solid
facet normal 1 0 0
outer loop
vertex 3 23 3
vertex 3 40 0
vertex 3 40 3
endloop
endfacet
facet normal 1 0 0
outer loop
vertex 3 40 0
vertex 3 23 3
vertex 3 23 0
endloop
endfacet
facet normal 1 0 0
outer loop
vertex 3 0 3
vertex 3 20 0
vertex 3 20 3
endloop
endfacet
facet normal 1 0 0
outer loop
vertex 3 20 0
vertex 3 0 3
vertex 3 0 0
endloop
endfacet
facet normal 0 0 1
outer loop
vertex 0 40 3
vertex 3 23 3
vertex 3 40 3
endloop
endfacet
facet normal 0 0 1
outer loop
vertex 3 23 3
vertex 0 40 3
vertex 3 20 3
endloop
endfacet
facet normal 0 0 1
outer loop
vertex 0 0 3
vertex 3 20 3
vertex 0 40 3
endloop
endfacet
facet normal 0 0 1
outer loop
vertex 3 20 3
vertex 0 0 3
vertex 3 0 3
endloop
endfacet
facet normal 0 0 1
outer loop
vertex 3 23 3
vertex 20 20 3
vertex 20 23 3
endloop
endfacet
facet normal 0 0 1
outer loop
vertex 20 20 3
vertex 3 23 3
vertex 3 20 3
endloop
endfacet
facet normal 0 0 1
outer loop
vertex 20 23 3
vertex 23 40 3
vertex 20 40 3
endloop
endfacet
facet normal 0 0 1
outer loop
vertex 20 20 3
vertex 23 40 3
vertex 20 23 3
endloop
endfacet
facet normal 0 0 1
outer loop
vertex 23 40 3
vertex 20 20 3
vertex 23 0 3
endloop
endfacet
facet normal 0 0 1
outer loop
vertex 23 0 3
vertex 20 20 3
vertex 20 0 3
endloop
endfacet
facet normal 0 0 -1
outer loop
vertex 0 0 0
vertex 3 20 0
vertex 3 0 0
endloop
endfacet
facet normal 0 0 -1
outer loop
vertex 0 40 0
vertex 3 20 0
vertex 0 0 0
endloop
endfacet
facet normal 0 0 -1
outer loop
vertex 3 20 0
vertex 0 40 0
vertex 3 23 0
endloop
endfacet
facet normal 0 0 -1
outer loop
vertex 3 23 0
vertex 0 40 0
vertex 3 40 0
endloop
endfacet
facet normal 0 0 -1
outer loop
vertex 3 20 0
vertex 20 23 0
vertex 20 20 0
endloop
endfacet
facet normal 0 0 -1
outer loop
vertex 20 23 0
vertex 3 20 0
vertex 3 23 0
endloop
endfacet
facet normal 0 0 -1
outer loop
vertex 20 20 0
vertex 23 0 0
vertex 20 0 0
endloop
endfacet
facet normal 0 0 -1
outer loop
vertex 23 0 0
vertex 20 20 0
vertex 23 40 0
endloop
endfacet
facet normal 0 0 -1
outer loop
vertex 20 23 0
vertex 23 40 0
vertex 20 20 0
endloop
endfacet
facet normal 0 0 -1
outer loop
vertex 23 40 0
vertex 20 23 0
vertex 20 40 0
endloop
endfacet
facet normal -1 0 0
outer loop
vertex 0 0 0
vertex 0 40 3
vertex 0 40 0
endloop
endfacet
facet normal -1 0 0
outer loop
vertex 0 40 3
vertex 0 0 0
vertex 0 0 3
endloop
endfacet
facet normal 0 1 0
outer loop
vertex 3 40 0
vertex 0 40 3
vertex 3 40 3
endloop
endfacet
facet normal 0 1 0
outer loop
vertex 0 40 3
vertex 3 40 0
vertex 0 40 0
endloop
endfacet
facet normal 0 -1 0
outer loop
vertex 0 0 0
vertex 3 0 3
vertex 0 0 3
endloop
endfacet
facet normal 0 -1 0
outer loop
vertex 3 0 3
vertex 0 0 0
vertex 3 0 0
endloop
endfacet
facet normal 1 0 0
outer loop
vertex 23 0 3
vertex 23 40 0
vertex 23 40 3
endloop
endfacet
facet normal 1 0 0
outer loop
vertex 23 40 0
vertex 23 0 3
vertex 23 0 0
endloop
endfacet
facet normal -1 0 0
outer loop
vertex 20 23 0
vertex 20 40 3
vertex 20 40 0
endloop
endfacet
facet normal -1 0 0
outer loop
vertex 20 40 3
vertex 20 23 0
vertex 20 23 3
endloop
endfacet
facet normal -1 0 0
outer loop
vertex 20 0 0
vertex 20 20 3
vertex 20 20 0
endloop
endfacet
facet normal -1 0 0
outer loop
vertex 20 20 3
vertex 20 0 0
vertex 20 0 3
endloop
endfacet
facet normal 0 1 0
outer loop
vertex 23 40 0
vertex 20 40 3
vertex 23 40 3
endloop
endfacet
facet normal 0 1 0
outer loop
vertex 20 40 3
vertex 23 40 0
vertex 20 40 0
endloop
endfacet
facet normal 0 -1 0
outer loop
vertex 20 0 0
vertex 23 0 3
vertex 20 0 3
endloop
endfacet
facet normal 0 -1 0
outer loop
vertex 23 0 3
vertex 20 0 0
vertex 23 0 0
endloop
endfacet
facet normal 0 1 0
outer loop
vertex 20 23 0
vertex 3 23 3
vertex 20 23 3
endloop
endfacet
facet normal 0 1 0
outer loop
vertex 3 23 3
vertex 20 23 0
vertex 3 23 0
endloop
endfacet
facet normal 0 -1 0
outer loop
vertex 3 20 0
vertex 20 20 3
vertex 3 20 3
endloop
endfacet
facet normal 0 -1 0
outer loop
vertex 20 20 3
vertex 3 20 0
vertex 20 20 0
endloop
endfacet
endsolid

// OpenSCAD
//буква h
union(){
 cube([3,40,3]);
 translate([20,0,0]) cube([3,40,3]);
 translate([0,20,0]) cube([20,3,3]);
}
